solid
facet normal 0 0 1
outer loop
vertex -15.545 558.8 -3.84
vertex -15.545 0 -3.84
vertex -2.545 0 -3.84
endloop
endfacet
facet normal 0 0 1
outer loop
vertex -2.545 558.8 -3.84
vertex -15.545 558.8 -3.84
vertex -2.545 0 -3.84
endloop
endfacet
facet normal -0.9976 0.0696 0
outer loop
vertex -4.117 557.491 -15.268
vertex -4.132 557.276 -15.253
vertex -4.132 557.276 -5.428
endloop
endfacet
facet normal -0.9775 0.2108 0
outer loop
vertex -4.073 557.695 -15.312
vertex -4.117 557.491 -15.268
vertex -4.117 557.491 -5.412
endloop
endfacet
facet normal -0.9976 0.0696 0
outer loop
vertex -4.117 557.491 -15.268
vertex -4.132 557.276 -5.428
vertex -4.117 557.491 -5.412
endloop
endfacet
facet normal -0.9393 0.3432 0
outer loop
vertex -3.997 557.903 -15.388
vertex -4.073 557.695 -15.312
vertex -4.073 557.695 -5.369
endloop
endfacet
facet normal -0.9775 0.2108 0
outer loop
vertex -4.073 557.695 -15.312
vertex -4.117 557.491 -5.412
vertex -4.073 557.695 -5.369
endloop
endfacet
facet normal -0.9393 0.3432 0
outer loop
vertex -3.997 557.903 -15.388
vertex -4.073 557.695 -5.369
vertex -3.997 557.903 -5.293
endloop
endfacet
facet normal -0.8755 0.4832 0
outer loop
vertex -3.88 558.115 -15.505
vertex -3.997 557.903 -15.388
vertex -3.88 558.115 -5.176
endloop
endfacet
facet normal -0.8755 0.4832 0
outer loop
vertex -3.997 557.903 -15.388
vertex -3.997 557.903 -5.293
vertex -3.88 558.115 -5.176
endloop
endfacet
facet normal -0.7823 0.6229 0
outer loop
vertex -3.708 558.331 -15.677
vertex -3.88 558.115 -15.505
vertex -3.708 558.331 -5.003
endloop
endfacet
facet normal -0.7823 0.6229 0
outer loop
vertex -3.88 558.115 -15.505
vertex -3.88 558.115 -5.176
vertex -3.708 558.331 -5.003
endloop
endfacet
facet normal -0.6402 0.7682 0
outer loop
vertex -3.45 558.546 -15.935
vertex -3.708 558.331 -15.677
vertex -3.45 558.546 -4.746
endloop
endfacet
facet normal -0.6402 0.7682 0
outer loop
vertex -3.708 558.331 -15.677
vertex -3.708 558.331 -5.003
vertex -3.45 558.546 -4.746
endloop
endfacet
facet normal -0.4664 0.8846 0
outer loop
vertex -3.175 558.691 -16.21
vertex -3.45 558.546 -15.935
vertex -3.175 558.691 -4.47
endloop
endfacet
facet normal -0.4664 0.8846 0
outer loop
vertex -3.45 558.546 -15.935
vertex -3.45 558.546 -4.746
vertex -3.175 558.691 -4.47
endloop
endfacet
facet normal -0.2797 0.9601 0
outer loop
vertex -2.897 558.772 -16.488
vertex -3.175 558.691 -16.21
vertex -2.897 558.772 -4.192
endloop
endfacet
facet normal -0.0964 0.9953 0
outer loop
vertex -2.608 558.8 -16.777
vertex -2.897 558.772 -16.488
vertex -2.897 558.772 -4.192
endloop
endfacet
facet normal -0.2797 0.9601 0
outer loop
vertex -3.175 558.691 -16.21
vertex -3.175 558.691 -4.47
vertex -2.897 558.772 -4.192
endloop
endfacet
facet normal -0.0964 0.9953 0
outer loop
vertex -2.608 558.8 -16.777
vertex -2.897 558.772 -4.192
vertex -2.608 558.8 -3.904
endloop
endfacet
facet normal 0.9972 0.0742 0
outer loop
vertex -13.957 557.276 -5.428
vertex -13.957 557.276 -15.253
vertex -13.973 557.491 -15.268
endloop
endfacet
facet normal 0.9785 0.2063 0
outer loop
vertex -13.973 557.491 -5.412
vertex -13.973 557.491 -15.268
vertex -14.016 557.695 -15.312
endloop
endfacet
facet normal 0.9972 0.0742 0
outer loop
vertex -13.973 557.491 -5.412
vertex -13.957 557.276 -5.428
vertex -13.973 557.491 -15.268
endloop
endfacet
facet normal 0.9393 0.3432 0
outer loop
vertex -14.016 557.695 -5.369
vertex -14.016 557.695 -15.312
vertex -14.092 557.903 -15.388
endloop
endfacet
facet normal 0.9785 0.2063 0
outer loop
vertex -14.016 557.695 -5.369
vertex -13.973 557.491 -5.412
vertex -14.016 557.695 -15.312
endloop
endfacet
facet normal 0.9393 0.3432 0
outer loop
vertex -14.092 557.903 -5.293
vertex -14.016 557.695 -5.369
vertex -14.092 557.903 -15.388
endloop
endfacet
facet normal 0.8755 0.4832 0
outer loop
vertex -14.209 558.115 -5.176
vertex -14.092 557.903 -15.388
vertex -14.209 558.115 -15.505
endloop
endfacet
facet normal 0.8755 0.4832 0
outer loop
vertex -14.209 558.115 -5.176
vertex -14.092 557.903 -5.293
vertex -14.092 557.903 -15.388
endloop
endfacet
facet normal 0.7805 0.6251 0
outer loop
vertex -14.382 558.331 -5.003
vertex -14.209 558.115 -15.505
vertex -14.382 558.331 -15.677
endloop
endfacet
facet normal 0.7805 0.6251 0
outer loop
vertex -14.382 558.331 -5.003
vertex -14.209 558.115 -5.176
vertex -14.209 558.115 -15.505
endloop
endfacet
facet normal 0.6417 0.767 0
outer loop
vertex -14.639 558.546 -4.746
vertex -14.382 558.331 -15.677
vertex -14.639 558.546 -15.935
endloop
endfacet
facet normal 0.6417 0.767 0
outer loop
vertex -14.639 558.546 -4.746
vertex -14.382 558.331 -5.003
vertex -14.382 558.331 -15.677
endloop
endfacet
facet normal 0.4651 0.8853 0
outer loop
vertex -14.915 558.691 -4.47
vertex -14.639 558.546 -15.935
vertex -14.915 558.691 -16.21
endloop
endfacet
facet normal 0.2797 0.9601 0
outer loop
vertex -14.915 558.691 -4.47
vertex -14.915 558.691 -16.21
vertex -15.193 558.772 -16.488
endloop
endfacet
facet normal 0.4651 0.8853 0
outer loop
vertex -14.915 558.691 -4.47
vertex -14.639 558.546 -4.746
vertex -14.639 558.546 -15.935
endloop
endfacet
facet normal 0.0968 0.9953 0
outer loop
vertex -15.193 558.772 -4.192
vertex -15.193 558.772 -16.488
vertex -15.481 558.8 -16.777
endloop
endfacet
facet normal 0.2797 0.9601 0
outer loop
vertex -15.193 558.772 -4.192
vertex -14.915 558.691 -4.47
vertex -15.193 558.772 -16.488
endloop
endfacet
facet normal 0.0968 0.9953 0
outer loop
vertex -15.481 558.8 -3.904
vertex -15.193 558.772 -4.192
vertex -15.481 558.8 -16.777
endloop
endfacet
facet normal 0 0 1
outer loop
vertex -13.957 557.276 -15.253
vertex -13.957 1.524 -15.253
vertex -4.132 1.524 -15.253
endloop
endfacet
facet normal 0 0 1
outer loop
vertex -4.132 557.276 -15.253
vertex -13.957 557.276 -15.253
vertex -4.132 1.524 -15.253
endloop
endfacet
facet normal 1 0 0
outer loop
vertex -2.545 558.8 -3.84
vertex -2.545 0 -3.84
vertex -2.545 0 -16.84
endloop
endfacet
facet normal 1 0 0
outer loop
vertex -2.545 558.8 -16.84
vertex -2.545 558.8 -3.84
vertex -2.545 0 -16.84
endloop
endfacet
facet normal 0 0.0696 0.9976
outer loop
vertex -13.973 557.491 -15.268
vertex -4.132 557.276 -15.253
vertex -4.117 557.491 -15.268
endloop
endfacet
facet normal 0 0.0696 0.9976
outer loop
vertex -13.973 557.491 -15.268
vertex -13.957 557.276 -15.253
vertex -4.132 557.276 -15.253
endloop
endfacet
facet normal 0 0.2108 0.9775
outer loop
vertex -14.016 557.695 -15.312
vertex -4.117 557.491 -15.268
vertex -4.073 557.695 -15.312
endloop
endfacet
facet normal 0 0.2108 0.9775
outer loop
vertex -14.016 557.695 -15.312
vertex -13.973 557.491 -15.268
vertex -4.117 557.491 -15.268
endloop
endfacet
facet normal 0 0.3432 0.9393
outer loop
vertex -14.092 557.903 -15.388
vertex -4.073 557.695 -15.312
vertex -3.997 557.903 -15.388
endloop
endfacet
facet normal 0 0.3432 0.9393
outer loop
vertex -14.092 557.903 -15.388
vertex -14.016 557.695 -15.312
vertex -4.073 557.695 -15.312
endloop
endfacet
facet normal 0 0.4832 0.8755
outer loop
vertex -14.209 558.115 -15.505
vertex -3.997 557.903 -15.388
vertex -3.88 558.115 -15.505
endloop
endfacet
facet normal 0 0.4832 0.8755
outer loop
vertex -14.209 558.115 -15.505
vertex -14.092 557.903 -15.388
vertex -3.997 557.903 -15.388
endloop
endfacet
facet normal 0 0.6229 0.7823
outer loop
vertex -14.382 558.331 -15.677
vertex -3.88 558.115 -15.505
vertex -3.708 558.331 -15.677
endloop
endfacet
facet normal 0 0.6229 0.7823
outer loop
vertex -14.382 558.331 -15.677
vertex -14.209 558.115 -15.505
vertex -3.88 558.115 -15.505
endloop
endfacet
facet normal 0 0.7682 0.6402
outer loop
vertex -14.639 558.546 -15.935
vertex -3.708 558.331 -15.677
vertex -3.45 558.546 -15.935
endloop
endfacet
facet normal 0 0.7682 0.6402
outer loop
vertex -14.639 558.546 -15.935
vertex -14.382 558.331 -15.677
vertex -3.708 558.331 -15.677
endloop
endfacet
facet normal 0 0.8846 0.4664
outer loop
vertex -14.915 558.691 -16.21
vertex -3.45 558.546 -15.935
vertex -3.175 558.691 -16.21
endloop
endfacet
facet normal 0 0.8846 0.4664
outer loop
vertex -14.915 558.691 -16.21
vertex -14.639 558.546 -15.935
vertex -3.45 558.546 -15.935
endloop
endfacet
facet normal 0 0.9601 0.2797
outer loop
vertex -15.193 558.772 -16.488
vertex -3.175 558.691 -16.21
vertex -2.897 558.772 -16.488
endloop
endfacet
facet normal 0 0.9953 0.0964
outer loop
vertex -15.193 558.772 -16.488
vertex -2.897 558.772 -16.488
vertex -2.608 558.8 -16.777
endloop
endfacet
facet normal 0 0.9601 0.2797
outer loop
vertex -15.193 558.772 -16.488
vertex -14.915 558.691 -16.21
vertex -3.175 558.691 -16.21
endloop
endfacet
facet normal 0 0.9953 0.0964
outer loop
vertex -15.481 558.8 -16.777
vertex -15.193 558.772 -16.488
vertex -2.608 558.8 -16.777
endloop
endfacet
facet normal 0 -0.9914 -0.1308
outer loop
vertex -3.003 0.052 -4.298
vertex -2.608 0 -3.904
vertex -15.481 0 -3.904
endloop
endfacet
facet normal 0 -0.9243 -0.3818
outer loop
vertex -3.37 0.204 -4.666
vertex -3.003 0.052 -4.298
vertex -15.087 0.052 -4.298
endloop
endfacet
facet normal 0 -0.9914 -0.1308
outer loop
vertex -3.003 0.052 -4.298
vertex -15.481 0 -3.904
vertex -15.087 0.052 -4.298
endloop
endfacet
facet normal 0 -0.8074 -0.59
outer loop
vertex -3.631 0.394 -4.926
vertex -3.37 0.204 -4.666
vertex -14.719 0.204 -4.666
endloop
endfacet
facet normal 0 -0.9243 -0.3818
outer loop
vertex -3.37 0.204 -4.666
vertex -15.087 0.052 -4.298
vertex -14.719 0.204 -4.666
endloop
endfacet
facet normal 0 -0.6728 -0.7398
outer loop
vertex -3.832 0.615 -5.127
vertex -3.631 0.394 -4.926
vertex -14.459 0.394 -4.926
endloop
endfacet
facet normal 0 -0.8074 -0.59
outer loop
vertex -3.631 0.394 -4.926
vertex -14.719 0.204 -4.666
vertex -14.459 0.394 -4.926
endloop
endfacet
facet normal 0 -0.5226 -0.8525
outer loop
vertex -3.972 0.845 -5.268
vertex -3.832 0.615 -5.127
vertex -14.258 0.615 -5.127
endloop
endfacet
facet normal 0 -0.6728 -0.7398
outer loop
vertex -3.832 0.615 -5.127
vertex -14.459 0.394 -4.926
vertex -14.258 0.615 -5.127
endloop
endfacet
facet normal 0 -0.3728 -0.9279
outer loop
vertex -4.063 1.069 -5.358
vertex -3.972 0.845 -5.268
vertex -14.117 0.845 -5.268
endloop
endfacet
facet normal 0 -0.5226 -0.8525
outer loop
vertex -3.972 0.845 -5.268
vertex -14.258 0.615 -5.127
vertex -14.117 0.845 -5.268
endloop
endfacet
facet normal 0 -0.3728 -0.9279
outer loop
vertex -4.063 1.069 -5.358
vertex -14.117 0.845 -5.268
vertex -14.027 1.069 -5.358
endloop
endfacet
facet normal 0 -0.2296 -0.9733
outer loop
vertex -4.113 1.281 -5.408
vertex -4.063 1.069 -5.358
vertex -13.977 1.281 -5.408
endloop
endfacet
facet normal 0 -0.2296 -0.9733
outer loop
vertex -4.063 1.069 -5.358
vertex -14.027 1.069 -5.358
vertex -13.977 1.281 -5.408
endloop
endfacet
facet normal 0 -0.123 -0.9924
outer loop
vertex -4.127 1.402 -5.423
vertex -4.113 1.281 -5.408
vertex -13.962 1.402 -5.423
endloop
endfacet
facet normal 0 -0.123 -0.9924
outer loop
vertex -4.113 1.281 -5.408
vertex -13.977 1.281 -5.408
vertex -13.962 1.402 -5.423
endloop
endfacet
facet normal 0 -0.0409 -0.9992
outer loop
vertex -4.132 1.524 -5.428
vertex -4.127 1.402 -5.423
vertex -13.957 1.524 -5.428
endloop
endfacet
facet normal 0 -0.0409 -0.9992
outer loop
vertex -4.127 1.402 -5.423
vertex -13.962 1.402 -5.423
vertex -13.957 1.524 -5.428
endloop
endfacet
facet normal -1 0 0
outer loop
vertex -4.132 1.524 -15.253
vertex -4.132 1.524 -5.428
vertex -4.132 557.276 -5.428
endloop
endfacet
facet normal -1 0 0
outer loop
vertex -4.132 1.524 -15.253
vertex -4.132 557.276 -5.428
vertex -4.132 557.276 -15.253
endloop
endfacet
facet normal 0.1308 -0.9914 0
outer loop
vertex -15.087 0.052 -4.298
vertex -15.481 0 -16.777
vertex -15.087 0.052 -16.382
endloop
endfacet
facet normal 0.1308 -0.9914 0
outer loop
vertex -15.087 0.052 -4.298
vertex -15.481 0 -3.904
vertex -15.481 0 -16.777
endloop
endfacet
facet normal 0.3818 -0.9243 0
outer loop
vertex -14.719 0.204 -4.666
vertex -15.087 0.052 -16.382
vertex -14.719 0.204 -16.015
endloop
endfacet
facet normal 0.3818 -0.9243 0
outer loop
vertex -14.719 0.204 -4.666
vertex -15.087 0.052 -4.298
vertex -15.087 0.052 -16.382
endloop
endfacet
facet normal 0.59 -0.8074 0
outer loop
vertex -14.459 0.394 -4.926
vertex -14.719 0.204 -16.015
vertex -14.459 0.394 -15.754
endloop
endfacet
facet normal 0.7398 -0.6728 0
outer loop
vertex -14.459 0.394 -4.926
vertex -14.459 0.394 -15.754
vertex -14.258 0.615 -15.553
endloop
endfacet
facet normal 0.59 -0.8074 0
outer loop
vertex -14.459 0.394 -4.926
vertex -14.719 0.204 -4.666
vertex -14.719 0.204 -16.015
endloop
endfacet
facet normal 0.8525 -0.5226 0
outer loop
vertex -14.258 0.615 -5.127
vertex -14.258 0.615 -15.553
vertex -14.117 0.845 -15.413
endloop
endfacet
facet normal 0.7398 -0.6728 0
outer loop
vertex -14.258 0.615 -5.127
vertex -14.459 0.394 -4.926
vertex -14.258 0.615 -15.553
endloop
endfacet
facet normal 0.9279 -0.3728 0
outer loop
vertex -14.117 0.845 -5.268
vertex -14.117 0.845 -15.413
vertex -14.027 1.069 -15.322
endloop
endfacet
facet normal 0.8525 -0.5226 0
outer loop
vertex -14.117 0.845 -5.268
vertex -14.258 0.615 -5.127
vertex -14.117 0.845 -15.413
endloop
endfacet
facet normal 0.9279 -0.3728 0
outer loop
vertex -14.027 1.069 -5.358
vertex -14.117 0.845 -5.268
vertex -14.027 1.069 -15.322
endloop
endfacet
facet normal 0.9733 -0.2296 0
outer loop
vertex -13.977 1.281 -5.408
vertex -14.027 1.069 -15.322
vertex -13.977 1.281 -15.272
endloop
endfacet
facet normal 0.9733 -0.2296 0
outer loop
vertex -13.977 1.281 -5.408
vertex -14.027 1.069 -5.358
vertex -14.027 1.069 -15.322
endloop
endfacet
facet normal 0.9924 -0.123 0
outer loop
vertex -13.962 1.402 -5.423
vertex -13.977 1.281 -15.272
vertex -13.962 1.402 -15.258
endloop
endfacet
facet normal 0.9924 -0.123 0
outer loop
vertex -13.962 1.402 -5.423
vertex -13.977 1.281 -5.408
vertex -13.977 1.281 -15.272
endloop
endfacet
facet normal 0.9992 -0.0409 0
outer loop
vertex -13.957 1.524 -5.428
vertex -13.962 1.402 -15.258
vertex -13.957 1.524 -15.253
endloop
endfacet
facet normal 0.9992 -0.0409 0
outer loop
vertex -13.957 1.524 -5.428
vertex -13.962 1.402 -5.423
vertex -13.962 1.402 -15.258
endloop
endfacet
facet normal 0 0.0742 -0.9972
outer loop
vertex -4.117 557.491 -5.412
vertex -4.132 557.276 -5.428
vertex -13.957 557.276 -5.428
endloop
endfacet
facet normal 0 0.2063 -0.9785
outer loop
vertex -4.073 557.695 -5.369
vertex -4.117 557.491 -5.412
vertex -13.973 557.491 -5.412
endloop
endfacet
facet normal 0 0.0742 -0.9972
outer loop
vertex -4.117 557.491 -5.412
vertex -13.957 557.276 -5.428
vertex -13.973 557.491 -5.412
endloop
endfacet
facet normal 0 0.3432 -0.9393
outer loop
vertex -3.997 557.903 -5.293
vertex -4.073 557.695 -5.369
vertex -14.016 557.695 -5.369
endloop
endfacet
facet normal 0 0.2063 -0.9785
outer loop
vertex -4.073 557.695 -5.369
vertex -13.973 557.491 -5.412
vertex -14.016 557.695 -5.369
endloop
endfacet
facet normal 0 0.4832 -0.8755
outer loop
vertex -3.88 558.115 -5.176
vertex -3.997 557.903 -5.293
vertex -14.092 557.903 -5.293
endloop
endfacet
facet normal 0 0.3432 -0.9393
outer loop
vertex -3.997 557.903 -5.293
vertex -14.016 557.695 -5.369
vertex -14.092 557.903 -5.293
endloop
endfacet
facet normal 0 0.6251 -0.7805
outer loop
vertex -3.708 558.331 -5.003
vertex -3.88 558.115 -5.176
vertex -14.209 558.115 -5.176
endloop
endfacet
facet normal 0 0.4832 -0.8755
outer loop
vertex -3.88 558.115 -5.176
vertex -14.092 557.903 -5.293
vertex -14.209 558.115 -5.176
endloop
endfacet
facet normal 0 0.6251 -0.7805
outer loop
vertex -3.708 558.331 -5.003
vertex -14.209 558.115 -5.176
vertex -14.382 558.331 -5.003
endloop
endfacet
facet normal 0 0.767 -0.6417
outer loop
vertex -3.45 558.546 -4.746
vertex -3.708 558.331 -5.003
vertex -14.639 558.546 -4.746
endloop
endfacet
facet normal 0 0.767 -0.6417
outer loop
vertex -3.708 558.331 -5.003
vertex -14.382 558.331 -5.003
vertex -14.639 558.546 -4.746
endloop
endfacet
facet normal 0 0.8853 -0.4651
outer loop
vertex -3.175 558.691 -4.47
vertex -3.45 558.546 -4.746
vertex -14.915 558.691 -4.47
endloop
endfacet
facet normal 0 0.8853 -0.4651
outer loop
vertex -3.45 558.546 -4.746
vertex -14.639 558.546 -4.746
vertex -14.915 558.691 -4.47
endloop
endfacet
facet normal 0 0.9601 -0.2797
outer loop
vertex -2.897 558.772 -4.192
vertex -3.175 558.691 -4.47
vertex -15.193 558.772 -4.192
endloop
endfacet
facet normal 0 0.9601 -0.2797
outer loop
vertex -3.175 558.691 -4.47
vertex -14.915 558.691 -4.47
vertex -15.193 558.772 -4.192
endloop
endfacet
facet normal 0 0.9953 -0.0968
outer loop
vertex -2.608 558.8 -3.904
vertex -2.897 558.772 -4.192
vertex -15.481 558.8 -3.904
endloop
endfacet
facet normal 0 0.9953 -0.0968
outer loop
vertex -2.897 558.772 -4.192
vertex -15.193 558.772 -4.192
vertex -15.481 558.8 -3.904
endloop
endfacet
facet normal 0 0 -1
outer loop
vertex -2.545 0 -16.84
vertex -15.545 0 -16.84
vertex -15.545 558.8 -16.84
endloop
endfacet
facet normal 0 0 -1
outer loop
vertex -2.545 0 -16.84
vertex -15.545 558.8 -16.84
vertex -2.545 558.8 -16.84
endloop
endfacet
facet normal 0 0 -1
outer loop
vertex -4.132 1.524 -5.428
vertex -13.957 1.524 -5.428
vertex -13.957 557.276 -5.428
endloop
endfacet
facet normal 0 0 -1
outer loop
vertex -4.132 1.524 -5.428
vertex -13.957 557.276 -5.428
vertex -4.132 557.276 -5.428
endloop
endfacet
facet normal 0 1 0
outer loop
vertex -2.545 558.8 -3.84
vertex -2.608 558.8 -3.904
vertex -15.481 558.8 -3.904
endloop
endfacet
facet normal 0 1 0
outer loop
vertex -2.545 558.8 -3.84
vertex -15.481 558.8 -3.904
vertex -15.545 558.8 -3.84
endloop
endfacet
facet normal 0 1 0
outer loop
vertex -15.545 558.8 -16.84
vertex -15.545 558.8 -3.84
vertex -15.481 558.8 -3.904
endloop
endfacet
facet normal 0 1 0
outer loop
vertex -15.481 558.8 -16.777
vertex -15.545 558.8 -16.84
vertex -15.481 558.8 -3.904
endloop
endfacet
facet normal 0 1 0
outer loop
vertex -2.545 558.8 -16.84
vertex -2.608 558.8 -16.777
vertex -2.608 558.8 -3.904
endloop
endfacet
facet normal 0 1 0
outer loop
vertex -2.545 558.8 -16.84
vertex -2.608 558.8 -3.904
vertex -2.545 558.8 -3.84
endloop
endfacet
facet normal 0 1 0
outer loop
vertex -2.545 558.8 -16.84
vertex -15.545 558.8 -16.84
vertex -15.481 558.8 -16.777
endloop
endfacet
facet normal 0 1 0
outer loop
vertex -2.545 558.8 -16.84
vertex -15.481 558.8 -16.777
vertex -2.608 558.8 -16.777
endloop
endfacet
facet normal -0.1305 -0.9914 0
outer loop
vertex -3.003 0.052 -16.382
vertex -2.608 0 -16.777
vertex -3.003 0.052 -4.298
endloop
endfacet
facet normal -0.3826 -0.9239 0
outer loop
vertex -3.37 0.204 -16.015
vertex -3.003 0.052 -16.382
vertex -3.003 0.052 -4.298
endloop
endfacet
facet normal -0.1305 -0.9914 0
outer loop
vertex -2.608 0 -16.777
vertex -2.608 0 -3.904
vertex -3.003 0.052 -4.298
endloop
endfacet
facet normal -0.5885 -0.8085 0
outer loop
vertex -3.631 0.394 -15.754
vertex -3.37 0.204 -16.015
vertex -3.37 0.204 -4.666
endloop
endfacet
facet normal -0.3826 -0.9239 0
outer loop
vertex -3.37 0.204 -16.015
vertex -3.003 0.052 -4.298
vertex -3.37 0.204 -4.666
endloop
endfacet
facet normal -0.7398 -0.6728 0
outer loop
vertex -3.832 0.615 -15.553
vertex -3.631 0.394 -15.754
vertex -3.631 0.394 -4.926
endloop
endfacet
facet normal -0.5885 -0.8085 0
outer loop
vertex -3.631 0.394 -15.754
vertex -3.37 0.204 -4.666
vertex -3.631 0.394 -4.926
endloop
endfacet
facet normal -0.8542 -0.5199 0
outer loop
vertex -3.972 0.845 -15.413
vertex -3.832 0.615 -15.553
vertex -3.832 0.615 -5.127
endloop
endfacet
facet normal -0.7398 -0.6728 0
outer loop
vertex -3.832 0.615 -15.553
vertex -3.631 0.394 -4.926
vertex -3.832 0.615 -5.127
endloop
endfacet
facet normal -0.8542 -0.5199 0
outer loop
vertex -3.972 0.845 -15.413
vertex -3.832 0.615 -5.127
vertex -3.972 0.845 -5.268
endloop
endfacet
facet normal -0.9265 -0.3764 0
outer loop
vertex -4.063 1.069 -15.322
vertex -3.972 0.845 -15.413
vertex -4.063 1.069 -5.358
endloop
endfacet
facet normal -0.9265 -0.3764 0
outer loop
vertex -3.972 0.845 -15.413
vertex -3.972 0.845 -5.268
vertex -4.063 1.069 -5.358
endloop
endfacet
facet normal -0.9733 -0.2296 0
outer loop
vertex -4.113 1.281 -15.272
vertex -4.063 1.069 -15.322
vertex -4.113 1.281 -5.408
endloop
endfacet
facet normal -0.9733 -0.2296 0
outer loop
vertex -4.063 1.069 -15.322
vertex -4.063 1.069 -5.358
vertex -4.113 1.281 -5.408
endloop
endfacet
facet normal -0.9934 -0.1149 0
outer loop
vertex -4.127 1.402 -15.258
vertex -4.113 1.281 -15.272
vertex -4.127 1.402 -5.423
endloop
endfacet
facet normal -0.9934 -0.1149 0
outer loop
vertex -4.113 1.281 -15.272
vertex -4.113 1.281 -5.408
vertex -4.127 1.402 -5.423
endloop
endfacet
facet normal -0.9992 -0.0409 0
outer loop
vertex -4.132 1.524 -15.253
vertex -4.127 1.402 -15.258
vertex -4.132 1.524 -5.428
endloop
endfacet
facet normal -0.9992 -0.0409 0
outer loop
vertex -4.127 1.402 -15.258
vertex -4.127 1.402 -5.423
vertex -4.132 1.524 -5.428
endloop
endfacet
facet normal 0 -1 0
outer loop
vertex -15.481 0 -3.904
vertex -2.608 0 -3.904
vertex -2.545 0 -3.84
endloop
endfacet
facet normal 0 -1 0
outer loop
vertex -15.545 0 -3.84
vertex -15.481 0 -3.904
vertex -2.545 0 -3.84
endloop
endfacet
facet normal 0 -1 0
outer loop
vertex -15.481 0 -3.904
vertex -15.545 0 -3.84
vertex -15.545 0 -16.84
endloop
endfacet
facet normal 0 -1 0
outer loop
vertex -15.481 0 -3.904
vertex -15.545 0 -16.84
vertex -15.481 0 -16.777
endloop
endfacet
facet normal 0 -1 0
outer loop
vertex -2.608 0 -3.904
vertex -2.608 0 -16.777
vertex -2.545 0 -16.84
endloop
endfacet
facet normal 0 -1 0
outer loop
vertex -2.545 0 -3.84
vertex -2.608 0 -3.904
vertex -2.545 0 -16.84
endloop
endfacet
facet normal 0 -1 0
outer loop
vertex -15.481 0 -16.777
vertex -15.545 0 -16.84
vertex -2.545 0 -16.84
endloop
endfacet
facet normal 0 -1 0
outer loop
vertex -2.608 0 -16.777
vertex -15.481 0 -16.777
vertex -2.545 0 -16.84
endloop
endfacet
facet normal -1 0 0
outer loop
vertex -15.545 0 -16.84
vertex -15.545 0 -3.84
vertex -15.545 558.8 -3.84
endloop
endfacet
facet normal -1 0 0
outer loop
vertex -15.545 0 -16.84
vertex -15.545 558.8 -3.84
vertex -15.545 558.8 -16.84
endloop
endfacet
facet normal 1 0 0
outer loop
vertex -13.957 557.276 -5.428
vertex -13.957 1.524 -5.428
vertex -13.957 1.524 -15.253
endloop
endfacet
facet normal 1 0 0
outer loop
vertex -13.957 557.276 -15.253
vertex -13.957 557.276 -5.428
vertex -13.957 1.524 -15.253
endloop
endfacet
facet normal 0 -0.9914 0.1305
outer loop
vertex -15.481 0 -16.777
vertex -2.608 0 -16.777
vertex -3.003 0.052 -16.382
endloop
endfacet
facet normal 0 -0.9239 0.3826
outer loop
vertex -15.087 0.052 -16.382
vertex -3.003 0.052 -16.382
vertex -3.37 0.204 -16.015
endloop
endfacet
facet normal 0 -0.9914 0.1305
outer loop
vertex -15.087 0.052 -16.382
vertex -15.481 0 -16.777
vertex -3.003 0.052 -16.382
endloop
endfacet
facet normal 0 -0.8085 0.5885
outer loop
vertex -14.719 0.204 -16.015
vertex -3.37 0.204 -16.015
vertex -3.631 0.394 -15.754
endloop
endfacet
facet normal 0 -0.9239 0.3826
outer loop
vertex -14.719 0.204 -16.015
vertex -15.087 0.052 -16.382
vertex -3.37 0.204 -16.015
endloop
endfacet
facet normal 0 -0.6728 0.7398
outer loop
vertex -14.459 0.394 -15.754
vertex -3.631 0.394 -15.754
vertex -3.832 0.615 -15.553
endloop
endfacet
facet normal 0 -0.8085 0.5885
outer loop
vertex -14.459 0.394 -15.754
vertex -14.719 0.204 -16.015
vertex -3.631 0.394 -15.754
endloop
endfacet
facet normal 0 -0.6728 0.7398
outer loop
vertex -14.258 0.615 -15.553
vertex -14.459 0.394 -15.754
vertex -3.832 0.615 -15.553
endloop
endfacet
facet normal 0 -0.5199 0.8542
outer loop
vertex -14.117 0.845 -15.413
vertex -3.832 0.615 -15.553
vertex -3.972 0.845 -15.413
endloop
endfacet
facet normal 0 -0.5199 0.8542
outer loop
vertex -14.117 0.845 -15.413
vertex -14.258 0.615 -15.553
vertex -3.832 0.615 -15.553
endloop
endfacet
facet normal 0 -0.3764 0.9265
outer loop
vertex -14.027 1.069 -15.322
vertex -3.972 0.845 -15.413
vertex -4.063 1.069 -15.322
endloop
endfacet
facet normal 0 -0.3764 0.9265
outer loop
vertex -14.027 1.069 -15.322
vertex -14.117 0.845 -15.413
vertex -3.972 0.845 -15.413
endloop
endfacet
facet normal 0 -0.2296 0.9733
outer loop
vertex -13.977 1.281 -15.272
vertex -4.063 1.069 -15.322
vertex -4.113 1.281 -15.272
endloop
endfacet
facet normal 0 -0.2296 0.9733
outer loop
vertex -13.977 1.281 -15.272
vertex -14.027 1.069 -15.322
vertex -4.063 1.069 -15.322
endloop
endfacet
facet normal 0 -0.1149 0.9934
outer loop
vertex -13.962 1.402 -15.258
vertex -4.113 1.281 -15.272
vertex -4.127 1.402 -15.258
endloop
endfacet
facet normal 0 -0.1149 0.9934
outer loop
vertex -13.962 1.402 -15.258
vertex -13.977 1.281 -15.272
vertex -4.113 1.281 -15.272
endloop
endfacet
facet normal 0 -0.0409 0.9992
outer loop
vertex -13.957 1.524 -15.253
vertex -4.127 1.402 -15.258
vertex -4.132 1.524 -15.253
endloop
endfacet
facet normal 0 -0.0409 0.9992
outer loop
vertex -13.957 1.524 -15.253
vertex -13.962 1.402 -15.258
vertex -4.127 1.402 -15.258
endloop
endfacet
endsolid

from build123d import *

# Parameters (mm, degrees)
SKETCH1_W           = 13
SKETCH1_H           = 13
BOSS_EXTRUDE1_DEPTH = 558.8
SHELL1_T            = -1.5875
FILLET1_R           = 1.524
FILLET2_R           = 1.524


with BuildPart() as part:
    # Sketch1 → Boss-Extrude1 (new body)
    with BuildSketch(Plane(origin=(0, 0, 0), x_dir=(1, 0, 0), z_dir=(0, 1, 0))):
        with Locations((-9.0448, 10.3402)):
            Rectangle(SKETCH1_W, SKETCH1_H)
    extrude(amount=BOSS_EXTRUDE1_DEPTH)

    # Shell1
    shell1_openings = [part.faces().sort_by_distance(p)[0] for p in [
        (-9.0448, 558.8, -10.3402),
        (-9.0448, 0, -10.3402),
    ]]
    offset(amount=SHELL1_T, openings=shell1_openings, kind=Kind.INTERSECTION)

    # Fillet1
    fillet1_edges = [part.edges().sort_by_distance(p)[0] for p in [
        (-13.9573, 0, -10.3402),
        (-9.0448, 0, -5.4277),
        (-4.1323, 0, -10.3402),
        (-9.0448, 0, -15.2527),
    ]]
    fillet(fillet1_edges, radius=FILLET1_R)

    # Fillet2
    fillet2_edges = [part.edges().sort_by_distance(p)[0] for p in [
        (-13.9573, 558.8, -10.3402),
        (-9.0448, 558.8, -5.4277),
        (-4.1323, 558.8, -10.3402),
        (-9.0448, 558.8, -15.2527),
    ]]
    fillet(fillet2_edges, radius=FILLET2_R)


solid = part.part
